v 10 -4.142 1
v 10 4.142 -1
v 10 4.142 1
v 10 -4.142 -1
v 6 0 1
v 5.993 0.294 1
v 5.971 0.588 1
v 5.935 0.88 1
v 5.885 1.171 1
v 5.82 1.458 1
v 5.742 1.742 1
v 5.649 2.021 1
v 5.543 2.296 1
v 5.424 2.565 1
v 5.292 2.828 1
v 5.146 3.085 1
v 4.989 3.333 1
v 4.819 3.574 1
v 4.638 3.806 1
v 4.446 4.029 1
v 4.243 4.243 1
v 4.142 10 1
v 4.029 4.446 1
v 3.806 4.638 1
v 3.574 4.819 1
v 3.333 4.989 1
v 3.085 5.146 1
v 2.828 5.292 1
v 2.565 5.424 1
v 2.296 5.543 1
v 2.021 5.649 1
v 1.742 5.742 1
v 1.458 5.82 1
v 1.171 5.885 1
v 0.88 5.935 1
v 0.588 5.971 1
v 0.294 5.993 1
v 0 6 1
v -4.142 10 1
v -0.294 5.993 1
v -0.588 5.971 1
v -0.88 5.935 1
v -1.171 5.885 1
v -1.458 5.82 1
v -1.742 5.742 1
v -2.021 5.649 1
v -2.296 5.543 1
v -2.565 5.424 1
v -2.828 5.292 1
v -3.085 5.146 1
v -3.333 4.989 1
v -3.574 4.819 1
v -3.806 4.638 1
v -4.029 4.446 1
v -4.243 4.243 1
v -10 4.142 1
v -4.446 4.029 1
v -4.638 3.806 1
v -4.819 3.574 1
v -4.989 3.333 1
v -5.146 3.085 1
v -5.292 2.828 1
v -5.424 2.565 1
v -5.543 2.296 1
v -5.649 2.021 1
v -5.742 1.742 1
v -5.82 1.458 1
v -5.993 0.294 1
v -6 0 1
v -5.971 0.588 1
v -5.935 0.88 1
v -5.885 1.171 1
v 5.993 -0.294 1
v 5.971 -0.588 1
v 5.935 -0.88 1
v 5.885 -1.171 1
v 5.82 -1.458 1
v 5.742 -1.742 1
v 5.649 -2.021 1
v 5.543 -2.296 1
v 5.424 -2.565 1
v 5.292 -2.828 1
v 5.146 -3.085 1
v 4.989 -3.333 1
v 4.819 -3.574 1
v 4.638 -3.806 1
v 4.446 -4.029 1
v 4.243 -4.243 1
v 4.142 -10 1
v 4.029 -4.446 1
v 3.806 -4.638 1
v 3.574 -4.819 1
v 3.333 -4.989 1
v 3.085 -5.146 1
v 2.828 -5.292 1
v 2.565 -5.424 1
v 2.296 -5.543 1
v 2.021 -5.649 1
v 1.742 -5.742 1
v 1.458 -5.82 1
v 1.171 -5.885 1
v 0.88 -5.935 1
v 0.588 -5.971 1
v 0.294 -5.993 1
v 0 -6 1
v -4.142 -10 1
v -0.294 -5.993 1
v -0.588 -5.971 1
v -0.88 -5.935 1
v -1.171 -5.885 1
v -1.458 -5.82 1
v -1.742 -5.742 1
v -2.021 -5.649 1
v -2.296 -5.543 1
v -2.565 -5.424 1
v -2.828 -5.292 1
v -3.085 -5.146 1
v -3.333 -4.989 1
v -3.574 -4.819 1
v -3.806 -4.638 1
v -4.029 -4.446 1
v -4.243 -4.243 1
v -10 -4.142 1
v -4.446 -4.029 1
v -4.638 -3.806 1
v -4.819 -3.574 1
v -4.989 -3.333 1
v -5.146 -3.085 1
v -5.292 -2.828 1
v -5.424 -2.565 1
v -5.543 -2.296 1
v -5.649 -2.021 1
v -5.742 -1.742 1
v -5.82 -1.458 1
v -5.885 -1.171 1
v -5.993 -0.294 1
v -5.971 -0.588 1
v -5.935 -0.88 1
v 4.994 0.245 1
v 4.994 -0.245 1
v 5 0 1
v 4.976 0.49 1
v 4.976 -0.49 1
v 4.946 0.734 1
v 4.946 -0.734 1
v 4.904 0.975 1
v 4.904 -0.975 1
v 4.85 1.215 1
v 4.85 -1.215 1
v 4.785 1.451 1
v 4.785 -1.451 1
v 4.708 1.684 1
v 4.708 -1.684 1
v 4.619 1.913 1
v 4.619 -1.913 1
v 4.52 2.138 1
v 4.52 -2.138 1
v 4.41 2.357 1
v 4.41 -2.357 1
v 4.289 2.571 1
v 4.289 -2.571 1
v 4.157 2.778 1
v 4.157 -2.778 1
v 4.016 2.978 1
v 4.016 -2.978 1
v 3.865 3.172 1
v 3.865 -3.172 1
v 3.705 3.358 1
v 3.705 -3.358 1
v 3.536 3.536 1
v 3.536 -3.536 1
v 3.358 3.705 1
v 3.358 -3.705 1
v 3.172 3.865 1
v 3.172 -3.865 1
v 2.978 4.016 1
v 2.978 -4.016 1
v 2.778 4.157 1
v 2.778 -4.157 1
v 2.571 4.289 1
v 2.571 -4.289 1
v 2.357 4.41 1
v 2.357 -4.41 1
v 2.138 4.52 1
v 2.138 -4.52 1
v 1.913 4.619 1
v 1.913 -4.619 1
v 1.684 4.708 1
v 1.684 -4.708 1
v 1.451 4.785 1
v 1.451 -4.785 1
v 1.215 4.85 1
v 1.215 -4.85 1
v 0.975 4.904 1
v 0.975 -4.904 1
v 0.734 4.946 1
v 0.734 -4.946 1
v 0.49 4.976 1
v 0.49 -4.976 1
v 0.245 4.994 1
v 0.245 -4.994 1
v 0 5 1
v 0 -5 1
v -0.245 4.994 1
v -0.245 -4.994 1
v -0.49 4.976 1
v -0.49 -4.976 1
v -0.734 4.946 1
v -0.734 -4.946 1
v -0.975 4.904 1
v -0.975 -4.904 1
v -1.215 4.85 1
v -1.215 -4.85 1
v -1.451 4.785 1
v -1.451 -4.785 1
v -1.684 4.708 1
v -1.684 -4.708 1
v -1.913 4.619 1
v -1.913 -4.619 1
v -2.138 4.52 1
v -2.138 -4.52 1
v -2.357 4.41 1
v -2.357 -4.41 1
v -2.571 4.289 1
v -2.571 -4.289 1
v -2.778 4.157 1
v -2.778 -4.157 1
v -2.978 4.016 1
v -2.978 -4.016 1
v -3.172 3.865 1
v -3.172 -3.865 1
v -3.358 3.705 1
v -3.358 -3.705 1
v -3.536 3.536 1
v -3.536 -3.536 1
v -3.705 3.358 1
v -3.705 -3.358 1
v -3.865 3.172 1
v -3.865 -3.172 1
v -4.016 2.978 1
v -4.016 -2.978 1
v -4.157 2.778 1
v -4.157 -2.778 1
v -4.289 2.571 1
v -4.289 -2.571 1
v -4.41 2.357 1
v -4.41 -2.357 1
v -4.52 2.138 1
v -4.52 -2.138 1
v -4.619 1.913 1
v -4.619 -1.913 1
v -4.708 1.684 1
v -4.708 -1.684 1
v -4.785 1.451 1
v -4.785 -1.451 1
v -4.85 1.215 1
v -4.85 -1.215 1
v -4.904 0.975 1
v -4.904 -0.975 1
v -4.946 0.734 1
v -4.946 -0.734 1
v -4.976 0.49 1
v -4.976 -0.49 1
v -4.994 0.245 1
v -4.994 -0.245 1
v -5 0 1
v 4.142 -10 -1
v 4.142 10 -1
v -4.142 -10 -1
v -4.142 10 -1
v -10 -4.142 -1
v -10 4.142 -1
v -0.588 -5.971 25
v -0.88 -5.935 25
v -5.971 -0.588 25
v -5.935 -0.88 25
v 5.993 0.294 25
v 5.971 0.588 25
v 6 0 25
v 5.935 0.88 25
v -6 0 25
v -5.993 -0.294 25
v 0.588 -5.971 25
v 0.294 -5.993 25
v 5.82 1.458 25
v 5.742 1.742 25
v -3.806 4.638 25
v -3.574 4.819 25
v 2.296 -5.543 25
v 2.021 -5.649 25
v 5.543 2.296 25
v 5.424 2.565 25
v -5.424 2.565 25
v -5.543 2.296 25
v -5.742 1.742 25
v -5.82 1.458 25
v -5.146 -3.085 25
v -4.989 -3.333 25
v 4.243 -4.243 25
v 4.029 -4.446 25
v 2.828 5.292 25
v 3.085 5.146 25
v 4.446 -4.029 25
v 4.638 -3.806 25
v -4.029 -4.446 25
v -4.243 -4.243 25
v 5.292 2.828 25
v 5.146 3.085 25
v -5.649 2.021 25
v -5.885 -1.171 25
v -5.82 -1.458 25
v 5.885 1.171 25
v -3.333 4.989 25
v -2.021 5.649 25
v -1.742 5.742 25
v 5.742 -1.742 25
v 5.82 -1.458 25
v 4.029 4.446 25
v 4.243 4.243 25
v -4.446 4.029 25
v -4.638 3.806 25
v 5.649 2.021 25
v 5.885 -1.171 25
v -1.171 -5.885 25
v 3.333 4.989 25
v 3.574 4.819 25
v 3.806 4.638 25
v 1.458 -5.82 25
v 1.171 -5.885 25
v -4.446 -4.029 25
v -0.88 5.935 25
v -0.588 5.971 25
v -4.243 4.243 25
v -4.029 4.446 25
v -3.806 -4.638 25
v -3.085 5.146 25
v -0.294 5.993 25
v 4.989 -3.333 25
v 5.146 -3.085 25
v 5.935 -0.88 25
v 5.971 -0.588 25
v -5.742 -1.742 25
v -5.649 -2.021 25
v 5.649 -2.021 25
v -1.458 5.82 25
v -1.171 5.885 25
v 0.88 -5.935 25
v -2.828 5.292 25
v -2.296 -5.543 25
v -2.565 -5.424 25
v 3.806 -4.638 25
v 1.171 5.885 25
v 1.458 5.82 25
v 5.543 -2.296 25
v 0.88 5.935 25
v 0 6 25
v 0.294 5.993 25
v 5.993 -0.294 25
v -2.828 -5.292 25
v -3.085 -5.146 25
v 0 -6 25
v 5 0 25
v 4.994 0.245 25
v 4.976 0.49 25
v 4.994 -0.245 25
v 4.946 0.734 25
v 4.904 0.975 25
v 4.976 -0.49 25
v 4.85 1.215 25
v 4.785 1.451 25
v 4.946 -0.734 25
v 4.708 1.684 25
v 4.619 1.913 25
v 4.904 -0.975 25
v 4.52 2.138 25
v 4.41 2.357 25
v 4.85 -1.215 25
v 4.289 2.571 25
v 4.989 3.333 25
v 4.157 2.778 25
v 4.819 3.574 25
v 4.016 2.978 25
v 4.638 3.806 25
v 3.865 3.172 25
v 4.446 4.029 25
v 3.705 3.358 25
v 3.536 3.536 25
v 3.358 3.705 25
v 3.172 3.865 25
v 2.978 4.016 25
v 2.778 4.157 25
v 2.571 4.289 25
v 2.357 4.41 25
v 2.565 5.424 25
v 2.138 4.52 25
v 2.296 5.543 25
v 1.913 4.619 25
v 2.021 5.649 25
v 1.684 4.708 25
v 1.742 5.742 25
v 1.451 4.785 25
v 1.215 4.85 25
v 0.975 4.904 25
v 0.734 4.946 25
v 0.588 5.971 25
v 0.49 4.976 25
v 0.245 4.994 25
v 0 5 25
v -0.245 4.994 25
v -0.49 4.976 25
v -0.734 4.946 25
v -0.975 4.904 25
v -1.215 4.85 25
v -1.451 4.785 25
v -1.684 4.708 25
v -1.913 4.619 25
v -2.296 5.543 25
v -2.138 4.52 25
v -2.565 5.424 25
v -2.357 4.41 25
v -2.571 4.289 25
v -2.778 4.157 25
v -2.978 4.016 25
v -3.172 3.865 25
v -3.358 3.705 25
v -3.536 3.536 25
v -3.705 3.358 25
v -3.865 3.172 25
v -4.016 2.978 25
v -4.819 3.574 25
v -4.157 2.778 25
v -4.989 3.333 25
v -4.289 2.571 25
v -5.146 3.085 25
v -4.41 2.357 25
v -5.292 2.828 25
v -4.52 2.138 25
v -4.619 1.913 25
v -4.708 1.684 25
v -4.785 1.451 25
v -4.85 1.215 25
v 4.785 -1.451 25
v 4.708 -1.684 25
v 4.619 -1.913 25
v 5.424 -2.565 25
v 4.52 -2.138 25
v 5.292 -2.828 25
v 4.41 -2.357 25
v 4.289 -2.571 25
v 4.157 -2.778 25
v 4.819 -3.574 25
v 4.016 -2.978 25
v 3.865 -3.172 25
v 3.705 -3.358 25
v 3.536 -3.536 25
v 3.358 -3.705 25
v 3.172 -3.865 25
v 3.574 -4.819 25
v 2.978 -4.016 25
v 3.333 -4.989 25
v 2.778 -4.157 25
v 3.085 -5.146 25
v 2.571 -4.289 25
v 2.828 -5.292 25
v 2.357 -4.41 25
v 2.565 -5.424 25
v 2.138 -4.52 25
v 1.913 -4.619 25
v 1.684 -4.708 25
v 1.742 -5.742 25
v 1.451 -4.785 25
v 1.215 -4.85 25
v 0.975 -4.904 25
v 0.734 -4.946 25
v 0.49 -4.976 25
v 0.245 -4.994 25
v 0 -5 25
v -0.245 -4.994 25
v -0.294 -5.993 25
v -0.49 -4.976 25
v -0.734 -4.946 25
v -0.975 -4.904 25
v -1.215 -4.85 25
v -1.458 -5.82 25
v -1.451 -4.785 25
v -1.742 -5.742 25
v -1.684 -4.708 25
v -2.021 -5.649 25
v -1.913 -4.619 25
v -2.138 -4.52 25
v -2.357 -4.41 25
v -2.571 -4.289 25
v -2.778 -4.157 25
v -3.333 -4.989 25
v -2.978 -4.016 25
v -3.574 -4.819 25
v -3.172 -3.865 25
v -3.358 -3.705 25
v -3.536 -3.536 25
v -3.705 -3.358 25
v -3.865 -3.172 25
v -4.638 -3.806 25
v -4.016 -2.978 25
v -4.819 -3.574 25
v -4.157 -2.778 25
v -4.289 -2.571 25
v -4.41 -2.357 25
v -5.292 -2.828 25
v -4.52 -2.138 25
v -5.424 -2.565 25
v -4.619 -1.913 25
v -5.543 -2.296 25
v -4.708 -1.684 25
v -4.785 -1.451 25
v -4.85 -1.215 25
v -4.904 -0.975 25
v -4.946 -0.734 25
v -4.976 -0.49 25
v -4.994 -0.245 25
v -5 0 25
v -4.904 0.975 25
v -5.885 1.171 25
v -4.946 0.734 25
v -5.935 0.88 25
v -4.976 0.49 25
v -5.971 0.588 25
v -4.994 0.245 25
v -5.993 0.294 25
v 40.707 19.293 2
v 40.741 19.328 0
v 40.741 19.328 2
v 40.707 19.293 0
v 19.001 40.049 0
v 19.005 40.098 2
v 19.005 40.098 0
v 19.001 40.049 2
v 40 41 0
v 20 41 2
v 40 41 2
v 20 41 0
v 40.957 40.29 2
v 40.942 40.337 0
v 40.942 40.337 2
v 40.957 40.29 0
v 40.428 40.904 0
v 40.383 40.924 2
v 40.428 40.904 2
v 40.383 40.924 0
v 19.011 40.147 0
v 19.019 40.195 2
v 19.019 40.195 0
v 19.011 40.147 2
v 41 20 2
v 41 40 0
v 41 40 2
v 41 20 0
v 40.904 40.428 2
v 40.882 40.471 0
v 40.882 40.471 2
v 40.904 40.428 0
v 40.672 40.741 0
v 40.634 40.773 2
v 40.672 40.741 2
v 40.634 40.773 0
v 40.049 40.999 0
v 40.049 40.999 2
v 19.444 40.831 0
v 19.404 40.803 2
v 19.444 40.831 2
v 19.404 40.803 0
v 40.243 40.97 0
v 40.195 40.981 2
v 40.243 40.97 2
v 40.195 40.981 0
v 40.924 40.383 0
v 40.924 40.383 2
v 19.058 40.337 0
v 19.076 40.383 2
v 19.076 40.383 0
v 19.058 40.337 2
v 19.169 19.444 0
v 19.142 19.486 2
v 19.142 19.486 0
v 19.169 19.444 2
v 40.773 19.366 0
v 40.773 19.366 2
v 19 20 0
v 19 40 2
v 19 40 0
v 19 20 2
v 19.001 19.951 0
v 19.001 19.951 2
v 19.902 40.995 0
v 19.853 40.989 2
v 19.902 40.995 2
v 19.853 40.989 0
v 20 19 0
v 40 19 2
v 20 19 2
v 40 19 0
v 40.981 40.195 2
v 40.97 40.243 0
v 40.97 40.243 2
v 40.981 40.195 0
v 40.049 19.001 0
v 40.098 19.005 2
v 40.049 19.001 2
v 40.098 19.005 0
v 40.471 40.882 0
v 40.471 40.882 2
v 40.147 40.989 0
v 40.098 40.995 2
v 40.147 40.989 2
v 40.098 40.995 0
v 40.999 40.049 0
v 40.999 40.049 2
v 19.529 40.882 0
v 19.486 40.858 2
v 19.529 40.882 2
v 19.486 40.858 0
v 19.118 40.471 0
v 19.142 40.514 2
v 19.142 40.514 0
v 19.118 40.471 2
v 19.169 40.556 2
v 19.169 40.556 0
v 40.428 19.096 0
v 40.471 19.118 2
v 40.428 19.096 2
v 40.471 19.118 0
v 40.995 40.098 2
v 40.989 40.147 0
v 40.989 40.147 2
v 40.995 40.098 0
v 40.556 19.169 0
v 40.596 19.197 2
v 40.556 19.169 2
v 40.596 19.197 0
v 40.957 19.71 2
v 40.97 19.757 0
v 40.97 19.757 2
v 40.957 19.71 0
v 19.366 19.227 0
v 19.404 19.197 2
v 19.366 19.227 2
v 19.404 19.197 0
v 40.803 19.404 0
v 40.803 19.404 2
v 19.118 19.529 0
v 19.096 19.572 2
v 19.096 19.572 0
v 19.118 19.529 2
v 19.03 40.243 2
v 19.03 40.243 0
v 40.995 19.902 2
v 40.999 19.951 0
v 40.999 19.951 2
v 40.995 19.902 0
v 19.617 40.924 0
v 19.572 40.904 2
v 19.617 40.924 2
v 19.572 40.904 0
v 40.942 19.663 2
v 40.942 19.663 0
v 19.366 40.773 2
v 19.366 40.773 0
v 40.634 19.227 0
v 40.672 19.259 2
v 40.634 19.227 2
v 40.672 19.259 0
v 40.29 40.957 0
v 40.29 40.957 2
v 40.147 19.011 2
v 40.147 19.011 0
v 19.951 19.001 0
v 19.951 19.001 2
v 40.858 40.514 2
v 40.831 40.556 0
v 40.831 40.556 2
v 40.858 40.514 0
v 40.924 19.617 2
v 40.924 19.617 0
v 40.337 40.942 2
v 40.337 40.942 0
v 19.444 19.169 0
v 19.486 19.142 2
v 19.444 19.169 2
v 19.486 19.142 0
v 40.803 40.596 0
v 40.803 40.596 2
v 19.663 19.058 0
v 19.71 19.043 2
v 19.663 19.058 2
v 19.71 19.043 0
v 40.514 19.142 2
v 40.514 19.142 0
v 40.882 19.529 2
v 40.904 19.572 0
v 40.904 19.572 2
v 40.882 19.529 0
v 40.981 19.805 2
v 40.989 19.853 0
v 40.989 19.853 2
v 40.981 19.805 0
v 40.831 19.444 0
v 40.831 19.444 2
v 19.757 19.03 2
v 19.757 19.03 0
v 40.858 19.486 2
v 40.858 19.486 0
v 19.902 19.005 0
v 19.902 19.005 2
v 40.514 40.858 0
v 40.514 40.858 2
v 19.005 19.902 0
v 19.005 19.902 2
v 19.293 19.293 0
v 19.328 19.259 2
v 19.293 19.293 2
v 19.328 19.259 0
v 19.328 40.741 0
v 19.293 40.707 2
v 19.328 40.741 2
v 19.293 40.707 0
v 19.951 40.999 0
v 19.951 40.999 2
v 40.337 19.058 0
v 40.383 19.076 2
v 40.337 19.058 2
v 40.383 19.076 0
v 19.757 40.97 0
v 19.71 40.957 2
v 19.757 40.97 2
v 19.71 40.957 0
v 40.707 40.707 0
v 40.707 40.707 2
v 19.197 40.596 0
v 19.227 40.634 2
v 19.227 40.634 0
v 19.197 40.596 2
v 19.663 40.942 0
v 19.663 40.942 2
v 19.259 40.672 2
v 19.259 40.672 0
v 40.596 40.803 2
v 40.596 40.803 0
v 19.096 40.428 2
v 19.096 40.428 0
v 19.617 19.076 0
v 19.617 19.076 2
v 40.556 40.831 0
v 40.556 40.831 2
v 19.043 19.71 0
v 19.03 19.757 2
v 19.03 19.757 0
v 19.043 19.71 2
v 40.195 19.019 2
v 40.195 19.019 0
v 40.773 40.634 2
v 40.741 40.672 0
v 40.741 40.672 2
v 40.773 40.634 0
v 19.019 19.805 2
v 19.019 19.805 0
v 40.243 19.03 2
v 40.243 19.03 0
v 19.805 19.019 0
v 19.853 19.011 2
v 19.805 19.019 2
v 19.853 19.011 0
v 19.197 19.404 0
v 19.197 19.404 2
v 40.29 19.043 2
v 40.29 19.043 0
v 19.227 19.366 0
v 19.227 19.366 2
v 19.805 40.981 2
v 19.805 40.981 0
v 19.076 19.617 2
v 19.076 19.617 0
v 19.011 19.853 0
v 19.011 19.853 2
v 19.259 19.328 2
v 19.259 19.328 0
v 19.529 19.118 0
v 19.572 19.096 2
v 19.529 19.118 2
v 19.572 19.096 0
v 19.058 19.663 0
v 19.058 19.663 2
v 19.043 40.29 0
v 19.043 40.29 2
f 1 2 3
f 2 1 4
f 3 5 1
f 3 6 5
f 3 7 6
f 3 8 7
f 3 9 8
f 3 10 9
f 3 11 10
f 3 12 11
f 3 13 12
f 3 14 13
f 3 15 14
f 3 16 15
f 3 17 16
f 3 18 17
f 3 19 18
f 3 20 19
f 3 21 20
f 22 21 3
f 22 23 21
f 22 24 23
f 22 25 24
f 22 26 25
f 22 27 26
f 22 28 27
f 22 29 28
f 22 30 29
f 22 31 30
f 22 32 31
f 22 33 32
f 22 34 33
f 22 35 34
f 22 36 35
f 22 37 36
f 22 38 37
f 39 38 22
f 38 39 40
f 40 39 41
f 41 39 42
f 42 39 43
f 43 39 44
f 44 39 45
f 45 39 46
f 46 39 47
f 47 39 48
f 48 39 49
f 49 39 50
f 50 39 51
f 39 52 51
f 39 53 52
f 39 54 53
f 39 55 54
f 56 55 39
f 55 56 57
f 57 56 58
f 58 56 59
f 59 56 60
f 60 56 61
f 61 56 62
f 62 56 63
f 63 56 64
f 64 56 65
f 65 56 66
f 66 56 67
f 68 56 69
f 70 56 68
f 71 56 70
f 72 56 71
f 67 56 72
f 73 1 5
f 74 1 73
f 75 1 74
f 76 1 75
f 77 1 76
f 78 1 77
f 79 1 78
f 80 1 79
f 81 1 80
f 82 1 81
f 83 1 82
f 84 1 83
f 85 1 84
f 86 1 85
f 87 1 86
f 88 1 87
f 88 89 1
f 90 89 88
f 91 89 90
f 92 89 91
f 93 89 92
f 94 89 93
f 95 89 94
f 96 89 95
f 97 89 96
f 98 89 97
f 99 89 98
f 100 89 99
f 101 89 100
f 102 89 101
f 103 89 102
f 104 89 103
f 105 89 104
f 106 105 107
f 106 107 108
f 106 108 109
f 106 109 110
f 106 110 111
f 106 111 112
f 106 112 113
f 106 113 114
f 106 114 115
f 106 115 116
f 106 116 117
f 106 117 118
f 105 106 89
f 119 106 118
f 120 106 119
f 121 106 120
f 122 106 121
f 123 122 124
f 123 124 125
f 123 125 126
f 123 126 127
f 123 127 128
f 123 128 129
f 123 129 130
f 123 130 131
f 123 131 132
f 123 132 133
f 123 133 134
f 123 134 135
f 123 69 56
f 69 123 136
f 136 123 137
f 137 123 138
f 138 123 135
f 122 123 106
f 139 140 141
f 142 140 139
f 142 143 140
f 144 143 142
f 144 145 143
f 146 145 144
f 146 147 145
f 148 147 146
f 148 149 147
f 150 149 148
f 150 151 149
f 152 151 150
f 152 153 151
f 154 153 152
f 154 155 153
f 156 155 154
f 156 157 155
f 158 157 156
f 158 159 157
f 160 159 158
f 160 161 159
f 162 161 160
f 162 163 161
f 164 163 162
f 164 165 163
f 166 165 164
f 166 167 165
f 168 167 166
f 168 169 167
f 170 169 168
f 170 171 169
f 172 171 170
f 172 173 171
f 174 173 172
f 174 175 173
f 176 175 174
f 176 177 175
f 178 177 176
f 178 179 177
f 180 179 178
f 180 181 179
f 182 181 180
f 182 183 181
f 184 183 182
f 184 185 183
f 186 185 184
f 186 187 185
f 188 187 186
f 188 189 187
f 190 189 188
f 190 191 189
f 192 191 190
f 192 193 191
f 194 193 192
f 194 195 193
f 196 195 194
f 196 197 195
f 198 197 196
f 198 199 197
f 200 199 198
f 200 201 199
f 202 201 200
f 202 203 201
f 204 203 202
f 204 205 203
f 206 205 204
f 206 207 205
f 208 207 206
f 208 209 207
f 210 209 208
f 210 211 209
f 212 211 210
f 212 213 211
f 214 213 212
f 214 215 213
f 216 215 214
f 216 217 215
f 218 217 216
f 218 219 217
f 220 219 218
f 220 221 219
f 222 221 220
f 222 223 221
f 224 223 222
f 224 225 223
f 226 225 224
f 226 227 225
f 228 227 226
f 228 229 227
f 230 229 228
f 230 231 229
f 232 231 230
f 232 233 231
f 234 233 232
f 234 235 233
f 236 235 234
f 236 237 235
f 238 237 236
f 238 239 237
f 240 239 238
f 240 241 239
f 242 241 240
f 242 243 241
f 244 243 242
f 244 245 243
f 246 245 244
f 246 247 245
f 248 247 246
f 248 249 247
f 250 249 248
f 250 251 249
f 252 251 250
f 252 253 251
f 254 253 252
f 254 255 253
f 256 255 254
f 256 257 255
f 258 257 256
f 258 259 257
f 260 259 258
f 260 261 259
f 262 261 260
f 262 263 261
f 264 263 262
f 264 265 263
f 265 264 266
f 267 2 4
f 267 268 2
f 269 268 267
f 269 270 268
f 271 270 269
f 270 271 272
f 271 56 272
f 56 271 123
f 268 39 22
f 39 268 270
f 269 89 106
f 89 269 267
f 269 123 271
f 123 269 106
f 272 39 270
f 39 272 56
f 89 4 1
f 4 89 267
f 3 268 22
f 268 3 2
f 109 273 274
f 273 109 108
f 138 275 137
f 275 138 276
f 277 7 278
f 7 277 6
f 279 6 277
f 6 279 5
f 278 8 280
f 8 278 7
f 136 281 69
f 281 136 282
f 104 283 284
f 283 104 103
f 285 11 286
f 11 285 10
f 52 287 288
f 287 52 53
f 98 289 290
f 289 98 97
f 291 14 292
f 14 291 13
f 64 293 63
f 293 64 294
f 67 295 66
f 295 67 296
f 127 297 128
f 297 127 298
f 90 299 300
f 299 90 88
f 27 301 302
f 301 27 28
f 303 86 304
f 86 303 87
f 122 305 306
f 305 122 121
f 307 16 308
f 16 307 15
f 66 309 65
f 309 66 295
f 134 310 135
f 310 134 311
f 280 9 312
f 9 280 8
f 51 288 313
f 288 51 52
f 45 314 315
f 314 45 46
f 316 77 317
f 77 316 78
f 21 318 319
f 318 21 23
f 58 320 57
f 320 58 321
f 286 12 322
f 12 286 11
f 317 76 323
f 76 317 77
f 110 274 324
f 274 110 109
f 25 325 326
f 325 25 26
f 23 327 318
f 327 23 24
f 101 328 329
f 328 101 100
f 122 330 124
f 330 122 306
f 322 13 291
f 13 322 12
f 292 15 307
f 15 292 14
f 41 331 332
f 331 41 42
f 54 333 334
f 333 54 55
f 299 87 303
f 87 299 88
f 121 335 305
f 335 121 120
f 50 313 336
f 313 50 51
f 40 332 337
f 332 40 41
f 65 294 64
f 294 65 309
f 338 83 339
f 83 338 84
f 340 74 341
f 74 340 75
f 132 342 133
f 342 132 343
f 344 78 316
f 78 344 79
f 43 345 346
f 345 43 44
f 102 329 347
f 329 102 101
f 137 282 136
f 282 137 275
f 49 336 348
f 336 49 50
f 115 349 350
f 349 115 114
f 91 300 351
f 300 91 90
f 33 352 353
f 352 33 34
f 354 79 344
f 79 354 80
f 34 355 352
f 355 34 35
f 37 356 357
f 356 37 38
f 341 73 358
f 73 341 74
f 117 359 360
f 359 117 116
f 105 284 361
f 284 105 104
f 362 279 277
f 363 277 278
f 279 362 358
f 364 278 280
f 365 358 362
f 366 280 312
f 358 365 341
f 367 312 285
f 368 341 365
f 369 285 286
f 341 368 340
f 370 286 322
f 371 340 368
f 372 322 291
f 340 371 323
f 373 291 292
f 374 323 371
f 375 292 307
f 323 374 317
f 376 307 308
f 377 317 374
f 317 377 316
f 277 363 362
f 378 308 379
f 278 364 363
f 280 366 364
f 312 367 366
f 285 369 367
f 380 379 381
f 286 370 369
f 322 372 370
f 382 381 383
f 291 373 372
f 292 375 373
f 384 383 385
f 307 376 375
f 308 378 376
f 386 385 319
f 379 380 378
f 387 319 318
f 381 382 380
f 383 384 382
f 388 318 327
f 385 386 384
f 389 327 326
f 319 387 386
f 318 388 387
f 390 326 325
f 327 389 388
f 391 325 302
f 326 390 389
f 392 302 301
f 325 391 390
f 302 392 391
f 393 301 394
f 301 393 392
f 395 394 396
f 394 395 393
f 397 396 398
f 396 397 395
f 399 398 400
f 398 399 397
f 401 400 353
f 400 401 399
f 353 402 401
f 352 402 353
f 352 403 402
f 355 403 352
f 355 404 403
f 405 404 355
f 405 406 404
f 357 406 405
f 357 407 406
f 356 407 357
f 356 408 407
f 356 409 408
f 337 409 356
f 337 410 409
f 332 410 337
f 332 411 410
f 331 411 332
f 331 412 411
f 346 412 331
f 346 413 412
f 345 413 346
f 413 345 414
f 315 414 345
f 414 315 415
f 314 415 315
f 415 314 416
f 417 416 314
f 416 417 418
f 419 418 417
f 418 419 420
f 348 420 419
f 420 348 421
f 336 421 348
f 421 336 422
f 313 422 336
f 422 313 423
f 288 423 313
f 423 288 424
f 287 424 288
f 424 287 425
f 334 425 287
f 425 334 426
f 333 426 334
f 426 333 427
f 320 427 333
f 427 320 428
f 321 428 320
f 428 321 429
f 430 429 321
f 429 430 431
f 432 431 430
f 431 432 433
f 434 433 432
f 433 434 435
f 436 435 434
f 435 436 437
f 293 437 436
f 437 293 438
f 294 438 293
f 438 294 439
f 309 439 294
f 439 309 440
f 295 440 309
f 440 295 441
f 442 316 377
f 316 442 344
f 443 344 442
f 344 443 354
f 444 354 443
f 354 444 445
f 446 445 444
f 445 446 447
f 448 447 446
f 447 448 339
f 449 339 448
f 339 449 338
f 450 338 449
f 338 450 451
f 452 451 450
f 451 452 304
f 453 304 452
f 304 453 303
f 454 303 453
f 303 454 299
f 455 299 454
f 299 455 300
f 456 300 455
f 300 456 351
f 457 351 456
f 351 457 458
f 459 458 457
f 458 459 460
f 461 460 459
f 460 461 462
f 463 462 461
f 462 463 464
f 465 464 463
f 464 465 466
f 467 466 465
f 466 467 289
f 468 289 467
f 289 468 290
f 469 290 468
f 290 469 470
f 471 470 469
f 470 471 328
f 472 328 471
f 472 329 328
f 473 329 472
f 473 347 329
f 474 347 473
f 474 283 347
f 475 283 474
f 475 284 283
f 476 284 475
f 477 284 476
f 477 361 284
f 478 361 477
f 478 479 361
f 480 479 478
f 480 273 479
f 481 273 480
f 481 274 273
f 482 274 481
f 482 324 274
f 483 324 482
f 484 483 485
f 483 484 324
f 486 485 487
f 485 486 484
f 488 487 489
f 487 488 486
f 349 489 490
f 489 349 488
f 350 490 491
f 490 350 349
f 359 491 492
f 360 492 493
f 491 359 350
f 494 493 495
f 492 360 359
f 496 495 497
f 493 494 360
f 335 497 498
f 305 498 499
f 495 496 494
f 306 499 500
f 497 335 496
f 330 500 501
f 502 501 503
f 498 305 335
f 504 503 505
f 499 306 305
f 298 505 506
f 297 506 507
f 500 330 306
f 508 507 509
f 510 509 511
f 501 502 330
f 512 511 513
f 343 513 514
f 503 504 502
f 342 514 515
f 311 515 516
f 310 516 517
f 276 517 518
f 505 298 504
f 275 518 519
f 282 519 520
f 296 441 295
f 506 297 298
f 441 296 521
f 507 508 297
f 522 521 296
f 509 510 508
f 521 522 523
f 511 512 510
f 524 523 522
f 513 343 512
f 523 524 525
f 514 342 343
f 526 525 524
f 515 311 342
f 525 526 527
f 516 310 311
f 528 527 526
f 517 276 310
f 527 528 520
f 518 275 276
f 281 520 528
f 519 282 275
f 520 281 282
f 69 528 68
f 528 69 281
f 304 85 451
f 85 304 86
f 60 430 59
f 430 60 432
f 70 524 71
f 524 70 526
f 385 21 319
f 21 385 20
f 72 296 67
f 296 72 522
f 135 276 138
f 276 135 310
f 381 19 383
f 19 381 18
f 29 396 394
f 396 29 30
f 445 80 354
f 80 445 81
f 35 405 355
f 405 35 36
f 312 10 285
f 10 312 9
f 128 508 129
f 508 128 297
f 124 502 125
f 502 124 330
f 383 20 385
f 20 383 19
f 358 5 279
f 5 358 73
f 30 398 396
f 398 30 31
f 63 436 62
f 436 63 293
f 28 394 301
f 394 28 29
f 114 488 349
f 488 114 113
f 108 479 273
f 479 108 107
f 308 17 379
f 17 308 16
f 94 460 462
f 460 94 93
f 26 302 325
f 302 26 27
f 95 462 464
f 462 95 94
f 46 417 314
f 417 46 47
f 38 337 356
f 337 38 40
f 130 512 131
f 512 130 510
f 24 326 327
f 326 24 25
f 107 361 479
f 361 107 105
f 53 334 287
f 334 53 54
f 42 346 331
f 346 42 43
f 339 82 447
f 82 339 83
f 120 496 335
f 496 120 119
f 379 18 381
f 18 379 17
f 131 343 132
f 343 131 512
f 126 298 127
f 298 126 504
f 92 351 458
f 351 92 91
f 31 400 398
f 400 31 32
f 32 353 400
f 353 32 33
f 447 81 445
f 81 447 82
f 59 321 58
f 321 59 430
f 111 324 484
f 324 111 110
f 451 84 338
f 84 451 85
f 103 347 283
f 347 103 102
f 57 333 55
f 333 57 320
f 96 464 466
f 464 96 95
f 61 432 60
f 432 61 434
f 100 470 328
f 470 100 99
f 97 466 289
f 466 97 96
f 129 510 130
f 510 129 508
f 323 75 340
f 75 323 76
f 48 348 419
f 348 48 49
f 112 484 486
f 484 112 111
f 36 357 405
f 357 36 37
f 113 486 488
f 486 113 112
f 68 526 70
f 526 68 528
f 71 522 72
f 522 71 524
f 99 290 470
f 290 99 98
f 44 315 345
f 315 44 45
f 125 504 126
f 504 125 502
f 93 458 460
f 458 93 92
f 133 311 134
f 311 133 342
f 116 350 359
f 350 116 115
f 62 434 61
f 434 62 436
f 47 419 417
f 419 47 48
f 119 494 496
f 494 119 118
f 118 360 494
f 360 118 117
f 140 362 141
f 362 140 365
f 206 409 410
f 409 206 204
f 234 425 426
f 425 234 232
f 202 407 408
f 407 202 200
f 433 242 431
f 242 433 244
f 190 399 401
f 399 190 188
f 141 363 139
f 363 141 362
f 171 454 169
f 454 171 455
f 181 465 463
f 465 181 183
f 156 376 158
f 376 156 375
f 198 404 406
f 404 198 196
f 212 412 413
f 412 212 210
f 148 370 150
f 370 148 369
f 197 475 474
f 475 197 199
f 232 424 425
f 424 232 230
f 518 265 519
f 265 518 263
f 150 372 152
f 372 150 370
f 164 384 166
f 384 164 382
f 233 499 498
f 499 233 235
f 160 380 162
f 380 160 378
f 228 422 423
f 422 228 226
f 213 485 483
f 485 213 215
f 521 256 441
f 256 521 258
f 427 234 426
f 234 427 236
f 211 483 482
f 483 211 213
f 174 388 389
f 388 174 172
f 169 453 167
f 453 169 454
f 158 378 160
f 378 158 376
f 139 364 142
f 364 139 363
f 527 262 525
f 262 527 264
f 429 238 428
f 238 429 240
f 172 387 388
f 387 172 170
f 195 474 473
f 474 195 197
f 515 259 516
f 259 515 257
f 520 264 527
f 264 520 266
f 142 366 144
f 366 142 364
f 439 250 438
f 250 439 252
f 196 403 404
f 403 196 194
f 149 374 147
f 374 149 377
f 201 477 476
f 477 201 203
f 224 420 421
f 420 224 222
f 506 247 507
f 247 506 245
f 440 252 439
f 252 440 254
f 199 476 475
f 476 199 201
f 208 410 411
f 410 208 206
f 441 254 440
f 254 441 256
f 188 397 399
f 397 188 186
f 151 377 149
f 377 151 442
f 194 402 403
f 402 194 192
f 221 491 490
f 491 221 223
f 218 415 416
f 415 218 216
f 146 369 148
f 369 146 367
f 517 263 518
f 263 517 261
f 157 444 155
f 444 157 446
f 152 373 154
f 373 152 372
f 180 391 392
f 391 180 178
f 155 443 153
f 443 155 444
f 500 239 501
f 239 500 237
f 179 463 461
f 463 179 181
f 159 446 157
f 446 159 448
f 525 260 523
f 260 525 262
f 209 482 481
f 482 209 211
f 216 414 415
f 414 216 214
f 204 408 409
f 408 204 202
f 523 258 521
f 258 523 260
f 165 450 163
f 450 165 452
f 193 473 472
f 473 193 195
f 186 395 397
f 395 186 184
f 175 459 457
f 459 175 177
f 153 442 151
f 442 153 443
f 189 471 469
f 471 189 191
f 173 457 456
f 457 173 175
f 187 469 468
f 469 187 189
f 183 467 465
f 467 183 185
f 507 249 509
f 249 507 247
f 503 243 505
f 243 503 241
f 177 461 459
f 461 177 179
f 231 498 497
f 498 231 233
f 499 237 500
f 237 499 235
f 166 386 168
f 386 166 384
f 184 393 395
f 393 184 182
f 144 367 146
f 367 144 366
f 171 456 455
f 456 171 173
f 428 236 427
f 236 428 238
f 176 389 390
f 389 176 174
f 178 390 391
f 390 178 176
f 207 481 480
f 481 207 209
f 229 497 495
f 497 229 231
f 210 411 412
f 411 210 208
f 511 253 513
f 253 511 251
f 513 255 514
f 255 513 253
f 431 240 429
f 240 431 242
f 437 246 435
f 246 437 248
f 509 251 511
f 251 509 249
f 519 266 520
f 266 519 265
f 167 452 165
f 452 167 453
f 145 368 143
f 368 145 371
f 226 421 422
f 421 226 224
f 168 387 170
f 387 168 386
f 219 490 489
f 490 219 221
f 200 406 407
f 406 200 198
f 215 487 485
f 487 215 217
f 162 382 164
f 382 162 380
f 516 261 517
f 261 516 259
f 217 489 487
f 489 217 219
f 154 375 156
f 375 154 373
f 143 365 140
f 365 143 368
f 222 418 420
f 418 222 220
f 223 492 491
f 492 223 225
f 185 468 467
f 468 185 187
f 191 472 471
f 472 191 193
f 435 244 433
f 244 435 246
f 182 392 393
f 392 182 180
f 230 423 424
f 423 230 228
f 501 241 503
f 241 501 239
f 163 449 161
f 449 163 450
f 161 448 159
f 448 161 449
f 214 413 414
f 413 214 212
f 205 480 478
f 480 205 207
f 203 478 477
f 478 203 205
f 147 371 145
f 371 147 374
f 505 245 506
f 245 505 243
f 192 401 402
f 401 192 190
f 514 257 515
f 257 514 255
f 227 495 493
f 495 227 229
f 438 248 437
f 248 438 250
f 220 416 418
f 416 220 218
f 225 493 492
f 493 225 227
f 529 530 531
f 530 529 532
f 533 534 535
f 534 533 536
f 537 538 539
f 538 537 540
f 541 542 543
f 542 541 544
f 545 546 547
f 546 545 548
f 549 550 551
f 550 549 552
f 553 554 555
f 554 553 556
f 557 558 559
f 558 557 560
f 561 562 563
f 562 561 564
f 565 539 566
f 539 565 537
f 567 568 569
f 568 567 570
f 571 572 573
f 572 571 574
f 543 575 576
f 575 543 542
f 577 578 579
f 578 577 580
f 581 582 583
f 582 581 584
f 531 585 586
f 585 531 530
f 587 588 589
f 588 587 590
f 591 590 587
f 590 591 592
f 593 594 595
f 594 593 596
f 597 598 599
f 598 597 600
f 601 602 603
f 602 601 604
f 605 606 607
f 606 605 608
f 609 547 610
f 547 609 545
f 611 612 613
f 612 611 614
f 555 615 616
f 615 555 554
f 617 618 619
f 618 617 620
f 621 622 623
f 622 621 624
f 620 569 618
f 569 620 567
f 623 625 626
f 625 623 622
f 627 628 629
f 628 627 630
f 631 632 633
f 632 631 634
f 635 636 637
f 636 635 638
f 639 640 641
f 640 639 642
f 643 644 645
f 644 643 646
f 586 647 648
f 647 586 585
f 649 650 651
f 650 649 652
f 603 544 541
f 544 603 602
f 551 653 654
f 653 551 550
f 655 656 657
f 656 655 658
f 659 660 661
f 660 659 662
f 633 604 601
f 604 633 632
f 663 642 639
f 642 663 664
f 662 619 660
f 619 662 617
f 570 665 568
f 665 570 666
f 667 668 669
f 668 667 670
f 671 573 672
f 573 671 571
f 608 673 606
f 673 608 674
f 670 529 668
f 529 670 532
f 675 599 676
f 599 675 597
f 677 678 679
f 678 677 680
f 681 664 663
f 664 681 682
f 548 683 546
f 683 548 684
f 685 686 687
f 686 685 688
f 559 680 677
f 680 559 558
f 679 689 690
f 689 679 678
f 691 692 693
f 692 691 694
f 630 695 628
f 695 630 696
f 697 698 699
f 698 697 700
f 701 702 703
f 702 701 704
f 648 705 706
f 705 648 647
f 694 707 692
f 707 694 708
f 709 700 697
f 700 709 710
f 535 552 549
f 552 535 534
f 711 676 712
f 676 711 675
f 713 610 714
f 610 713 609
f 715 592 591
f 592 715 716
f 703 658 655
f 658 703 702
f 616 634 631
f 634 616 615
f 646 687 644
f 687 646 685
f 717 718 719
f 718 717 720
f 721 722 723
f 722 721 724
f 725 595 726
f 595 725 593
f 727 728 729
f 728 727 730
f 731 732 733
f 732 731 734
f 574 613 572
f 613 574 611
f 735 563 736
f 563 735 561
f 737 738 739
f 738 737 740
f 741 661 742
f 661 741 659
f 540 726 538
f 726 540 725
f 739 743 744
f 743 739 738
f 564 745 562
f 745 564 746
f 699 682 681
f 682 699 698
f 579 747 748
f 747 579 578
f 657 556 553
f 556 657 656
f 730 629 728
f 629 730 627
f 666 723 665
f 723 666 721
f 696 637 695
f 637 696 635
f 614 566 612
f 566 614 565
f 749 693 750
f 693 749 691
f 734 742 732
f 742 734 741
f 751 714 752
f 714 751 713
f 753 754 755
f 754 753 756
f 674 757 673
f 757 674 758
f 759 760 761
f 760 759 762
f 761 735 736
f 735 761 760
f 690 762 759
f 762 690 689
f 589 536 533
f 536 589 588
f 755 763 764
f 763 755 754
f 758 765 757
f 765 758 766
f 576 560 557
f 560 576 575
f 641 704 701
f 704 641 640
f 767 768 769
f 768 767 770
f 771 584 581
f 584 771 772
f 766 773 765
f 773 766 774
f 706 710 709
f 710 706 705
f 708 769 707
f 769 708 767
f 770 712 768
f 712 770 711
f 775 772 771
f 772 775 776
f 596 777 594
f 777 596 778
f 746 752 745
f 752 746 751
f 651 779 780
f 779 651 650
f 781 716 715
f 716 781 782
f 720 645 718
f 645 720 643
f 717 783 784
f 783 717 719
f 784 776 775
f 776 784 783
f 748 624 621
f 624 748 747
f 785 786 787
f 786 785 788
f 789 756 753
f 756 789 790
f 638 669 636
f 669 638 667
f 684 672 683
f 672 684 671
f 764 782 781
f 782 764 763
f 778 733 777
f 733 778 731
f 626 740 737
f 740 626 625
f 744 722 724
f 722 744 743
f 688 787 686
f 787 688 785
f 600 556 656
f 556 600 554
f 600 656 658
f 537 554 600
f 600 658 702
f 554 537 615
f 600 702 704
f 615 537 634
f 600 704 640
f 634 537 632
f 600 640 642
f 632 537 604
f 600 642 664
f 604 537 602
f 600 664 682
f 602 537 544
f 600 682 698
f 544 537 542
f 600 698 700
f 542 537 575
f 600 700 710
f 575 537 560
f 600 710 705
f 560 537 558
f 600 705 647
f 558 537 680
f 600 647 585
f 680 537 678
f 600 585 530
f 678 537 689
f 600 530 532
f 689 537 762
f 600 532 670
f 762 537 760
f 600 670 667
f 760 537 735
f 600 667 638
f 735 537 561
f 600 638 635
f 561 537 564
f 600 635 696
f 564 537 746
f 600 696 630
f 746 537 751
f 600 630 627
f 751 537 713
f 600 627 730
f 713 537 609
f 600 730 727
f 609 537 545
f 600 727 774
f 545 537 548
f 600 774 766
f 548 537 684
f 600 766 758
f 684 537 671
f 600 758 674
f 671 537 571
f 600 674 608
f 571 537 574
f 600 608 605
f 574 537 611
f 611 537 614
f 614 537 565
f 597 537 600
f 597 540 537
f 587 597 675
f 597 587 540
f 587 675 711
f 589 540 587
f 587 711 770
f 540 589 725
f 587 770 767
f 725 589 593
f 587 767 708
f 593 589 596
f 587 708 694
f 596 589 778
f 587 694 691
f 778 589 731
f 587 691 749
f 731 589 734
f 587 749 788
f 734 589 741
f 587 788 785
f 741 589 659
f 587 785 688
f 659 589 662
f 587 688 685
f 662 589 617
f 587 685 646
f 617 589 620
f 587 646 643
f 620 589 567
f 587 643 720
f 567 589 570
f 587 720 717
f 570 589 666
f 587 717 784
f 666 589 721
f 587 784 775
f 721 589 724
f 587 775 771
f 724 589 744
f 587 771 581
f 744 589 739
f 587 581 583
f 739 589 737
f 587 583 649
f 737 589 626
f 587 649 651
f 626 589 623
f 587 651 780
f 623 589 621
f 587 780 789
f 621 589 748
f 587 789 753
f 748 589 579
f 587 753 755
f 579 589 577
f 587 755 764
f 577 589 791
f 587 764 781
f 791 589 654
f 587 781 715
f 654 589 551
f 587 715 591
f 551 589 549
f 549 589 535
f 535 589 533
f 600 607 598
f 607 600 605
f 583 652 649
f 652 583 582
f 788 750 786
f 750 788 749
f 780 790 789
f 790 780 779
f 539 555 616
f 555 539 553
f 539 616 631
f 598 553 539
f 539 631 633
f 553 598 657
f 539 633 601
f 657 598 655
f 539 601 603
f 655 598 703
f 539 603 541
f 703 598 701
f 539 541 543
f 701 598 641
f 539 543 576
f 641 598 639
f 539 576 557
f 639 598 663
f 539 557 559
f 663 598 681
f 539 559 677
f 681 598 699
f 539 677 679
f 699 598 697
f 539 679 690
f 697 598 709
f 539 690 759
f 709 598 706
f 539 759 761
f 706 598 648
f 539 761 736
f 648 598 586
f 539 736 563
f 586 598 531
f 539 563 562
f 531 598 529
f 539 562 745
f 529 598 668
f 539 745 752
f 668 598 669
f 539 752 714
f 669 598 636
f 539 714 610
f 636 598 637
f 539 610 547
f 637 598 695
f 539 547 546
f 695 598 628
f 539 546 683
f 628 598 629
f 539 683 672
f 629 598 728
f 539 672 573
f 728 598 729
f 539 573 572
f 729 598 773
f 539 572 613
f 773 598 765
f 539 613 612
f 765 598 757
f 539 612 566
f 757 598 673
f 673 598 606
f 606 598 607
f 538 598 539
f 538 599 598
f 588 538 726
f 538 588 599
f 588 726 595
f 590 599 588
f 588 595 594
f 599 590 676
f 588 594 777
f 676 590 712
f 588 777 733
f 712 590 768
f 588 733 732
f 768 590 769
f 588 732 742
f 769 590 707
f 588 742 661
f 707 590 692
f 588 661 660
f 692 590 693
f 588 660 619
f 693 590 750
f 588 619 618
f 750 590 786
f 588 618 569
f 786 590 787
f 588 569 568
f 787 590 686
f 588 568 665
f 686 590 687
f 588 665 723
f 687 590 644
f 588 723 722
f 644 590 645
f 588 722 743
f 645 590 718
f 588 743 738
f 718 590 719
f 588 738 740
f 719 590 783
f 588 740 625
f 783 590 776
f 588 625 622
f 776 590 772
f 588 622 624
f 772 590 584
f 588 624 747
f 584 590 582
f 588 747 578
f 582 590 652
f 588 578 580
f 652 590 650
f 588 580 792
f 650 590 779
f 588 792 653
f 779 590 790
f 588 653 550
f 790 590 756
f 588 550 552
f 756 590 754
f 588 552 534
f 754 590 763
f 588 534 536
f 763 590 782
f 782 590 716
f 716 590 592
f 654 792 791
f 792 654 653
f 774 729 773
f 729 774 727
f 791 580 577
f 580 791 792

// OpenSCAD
// intermediate shapes

// numbers used for size are interpreted by most printers as millimeters
thickness = 2; // variable to create 3mm thick pieces
diameter = 20; // 20mm circles
height = 25; // 45mm

// $fn is the variable for circles that determine how many 'facets' 
// are displayed.  Default is 10. 128 makes smoother circles
fn = 128;

// intersection keeps only the area where the items overlap
// create a hexagon
intersection()
{
    cube([diameter, diameter, thickness], center=true);
    
    // rotate spins the object on the [x,y,z] planes
    // easier to rotate before translate....e.g. translate-->rotate-->object
    // functions get called from the inside-out.
    rotate([0,0,45])cube([diameter, diameter, thickness], center=true);
}


// difference keeps only the first item with the overlap part of the second item removed
// create a tub
difference()
{
    cylinder(d=diameter*.60, h=height, $fn=fn);
    cylinder(d=diameter*.60-thickness, h=height, $fn=fn);
}

// hull wraps all areas with material (but does not increase the height)
// think of it like shrinkwrap
hull()
{
    // add color to objects.  Objects inside another object may not
    // show their color.  This is good for debugging
    color("red")
    translate([diameter, diameter, 0])
    cylinder(d=thickness, h=thickness, $fn=fn);
    
    color("yellow")
    translate([diameter*2, diameter, 0])
    cylinder(d=thickness, h=thickness, $fn=fn);
    
    color("green")
    translate([diameter*2, diameter*2, 0])
    cylinder(d=thickness, h=thickness, $fn=fn);
    
    color("purple")
    translate([diameter, diameter*2, 0])
    cylinder(d=thickness, h=thickness, $fn=fn);
}

//try wrapping the code above in hull, and you will get a duck foot :)
